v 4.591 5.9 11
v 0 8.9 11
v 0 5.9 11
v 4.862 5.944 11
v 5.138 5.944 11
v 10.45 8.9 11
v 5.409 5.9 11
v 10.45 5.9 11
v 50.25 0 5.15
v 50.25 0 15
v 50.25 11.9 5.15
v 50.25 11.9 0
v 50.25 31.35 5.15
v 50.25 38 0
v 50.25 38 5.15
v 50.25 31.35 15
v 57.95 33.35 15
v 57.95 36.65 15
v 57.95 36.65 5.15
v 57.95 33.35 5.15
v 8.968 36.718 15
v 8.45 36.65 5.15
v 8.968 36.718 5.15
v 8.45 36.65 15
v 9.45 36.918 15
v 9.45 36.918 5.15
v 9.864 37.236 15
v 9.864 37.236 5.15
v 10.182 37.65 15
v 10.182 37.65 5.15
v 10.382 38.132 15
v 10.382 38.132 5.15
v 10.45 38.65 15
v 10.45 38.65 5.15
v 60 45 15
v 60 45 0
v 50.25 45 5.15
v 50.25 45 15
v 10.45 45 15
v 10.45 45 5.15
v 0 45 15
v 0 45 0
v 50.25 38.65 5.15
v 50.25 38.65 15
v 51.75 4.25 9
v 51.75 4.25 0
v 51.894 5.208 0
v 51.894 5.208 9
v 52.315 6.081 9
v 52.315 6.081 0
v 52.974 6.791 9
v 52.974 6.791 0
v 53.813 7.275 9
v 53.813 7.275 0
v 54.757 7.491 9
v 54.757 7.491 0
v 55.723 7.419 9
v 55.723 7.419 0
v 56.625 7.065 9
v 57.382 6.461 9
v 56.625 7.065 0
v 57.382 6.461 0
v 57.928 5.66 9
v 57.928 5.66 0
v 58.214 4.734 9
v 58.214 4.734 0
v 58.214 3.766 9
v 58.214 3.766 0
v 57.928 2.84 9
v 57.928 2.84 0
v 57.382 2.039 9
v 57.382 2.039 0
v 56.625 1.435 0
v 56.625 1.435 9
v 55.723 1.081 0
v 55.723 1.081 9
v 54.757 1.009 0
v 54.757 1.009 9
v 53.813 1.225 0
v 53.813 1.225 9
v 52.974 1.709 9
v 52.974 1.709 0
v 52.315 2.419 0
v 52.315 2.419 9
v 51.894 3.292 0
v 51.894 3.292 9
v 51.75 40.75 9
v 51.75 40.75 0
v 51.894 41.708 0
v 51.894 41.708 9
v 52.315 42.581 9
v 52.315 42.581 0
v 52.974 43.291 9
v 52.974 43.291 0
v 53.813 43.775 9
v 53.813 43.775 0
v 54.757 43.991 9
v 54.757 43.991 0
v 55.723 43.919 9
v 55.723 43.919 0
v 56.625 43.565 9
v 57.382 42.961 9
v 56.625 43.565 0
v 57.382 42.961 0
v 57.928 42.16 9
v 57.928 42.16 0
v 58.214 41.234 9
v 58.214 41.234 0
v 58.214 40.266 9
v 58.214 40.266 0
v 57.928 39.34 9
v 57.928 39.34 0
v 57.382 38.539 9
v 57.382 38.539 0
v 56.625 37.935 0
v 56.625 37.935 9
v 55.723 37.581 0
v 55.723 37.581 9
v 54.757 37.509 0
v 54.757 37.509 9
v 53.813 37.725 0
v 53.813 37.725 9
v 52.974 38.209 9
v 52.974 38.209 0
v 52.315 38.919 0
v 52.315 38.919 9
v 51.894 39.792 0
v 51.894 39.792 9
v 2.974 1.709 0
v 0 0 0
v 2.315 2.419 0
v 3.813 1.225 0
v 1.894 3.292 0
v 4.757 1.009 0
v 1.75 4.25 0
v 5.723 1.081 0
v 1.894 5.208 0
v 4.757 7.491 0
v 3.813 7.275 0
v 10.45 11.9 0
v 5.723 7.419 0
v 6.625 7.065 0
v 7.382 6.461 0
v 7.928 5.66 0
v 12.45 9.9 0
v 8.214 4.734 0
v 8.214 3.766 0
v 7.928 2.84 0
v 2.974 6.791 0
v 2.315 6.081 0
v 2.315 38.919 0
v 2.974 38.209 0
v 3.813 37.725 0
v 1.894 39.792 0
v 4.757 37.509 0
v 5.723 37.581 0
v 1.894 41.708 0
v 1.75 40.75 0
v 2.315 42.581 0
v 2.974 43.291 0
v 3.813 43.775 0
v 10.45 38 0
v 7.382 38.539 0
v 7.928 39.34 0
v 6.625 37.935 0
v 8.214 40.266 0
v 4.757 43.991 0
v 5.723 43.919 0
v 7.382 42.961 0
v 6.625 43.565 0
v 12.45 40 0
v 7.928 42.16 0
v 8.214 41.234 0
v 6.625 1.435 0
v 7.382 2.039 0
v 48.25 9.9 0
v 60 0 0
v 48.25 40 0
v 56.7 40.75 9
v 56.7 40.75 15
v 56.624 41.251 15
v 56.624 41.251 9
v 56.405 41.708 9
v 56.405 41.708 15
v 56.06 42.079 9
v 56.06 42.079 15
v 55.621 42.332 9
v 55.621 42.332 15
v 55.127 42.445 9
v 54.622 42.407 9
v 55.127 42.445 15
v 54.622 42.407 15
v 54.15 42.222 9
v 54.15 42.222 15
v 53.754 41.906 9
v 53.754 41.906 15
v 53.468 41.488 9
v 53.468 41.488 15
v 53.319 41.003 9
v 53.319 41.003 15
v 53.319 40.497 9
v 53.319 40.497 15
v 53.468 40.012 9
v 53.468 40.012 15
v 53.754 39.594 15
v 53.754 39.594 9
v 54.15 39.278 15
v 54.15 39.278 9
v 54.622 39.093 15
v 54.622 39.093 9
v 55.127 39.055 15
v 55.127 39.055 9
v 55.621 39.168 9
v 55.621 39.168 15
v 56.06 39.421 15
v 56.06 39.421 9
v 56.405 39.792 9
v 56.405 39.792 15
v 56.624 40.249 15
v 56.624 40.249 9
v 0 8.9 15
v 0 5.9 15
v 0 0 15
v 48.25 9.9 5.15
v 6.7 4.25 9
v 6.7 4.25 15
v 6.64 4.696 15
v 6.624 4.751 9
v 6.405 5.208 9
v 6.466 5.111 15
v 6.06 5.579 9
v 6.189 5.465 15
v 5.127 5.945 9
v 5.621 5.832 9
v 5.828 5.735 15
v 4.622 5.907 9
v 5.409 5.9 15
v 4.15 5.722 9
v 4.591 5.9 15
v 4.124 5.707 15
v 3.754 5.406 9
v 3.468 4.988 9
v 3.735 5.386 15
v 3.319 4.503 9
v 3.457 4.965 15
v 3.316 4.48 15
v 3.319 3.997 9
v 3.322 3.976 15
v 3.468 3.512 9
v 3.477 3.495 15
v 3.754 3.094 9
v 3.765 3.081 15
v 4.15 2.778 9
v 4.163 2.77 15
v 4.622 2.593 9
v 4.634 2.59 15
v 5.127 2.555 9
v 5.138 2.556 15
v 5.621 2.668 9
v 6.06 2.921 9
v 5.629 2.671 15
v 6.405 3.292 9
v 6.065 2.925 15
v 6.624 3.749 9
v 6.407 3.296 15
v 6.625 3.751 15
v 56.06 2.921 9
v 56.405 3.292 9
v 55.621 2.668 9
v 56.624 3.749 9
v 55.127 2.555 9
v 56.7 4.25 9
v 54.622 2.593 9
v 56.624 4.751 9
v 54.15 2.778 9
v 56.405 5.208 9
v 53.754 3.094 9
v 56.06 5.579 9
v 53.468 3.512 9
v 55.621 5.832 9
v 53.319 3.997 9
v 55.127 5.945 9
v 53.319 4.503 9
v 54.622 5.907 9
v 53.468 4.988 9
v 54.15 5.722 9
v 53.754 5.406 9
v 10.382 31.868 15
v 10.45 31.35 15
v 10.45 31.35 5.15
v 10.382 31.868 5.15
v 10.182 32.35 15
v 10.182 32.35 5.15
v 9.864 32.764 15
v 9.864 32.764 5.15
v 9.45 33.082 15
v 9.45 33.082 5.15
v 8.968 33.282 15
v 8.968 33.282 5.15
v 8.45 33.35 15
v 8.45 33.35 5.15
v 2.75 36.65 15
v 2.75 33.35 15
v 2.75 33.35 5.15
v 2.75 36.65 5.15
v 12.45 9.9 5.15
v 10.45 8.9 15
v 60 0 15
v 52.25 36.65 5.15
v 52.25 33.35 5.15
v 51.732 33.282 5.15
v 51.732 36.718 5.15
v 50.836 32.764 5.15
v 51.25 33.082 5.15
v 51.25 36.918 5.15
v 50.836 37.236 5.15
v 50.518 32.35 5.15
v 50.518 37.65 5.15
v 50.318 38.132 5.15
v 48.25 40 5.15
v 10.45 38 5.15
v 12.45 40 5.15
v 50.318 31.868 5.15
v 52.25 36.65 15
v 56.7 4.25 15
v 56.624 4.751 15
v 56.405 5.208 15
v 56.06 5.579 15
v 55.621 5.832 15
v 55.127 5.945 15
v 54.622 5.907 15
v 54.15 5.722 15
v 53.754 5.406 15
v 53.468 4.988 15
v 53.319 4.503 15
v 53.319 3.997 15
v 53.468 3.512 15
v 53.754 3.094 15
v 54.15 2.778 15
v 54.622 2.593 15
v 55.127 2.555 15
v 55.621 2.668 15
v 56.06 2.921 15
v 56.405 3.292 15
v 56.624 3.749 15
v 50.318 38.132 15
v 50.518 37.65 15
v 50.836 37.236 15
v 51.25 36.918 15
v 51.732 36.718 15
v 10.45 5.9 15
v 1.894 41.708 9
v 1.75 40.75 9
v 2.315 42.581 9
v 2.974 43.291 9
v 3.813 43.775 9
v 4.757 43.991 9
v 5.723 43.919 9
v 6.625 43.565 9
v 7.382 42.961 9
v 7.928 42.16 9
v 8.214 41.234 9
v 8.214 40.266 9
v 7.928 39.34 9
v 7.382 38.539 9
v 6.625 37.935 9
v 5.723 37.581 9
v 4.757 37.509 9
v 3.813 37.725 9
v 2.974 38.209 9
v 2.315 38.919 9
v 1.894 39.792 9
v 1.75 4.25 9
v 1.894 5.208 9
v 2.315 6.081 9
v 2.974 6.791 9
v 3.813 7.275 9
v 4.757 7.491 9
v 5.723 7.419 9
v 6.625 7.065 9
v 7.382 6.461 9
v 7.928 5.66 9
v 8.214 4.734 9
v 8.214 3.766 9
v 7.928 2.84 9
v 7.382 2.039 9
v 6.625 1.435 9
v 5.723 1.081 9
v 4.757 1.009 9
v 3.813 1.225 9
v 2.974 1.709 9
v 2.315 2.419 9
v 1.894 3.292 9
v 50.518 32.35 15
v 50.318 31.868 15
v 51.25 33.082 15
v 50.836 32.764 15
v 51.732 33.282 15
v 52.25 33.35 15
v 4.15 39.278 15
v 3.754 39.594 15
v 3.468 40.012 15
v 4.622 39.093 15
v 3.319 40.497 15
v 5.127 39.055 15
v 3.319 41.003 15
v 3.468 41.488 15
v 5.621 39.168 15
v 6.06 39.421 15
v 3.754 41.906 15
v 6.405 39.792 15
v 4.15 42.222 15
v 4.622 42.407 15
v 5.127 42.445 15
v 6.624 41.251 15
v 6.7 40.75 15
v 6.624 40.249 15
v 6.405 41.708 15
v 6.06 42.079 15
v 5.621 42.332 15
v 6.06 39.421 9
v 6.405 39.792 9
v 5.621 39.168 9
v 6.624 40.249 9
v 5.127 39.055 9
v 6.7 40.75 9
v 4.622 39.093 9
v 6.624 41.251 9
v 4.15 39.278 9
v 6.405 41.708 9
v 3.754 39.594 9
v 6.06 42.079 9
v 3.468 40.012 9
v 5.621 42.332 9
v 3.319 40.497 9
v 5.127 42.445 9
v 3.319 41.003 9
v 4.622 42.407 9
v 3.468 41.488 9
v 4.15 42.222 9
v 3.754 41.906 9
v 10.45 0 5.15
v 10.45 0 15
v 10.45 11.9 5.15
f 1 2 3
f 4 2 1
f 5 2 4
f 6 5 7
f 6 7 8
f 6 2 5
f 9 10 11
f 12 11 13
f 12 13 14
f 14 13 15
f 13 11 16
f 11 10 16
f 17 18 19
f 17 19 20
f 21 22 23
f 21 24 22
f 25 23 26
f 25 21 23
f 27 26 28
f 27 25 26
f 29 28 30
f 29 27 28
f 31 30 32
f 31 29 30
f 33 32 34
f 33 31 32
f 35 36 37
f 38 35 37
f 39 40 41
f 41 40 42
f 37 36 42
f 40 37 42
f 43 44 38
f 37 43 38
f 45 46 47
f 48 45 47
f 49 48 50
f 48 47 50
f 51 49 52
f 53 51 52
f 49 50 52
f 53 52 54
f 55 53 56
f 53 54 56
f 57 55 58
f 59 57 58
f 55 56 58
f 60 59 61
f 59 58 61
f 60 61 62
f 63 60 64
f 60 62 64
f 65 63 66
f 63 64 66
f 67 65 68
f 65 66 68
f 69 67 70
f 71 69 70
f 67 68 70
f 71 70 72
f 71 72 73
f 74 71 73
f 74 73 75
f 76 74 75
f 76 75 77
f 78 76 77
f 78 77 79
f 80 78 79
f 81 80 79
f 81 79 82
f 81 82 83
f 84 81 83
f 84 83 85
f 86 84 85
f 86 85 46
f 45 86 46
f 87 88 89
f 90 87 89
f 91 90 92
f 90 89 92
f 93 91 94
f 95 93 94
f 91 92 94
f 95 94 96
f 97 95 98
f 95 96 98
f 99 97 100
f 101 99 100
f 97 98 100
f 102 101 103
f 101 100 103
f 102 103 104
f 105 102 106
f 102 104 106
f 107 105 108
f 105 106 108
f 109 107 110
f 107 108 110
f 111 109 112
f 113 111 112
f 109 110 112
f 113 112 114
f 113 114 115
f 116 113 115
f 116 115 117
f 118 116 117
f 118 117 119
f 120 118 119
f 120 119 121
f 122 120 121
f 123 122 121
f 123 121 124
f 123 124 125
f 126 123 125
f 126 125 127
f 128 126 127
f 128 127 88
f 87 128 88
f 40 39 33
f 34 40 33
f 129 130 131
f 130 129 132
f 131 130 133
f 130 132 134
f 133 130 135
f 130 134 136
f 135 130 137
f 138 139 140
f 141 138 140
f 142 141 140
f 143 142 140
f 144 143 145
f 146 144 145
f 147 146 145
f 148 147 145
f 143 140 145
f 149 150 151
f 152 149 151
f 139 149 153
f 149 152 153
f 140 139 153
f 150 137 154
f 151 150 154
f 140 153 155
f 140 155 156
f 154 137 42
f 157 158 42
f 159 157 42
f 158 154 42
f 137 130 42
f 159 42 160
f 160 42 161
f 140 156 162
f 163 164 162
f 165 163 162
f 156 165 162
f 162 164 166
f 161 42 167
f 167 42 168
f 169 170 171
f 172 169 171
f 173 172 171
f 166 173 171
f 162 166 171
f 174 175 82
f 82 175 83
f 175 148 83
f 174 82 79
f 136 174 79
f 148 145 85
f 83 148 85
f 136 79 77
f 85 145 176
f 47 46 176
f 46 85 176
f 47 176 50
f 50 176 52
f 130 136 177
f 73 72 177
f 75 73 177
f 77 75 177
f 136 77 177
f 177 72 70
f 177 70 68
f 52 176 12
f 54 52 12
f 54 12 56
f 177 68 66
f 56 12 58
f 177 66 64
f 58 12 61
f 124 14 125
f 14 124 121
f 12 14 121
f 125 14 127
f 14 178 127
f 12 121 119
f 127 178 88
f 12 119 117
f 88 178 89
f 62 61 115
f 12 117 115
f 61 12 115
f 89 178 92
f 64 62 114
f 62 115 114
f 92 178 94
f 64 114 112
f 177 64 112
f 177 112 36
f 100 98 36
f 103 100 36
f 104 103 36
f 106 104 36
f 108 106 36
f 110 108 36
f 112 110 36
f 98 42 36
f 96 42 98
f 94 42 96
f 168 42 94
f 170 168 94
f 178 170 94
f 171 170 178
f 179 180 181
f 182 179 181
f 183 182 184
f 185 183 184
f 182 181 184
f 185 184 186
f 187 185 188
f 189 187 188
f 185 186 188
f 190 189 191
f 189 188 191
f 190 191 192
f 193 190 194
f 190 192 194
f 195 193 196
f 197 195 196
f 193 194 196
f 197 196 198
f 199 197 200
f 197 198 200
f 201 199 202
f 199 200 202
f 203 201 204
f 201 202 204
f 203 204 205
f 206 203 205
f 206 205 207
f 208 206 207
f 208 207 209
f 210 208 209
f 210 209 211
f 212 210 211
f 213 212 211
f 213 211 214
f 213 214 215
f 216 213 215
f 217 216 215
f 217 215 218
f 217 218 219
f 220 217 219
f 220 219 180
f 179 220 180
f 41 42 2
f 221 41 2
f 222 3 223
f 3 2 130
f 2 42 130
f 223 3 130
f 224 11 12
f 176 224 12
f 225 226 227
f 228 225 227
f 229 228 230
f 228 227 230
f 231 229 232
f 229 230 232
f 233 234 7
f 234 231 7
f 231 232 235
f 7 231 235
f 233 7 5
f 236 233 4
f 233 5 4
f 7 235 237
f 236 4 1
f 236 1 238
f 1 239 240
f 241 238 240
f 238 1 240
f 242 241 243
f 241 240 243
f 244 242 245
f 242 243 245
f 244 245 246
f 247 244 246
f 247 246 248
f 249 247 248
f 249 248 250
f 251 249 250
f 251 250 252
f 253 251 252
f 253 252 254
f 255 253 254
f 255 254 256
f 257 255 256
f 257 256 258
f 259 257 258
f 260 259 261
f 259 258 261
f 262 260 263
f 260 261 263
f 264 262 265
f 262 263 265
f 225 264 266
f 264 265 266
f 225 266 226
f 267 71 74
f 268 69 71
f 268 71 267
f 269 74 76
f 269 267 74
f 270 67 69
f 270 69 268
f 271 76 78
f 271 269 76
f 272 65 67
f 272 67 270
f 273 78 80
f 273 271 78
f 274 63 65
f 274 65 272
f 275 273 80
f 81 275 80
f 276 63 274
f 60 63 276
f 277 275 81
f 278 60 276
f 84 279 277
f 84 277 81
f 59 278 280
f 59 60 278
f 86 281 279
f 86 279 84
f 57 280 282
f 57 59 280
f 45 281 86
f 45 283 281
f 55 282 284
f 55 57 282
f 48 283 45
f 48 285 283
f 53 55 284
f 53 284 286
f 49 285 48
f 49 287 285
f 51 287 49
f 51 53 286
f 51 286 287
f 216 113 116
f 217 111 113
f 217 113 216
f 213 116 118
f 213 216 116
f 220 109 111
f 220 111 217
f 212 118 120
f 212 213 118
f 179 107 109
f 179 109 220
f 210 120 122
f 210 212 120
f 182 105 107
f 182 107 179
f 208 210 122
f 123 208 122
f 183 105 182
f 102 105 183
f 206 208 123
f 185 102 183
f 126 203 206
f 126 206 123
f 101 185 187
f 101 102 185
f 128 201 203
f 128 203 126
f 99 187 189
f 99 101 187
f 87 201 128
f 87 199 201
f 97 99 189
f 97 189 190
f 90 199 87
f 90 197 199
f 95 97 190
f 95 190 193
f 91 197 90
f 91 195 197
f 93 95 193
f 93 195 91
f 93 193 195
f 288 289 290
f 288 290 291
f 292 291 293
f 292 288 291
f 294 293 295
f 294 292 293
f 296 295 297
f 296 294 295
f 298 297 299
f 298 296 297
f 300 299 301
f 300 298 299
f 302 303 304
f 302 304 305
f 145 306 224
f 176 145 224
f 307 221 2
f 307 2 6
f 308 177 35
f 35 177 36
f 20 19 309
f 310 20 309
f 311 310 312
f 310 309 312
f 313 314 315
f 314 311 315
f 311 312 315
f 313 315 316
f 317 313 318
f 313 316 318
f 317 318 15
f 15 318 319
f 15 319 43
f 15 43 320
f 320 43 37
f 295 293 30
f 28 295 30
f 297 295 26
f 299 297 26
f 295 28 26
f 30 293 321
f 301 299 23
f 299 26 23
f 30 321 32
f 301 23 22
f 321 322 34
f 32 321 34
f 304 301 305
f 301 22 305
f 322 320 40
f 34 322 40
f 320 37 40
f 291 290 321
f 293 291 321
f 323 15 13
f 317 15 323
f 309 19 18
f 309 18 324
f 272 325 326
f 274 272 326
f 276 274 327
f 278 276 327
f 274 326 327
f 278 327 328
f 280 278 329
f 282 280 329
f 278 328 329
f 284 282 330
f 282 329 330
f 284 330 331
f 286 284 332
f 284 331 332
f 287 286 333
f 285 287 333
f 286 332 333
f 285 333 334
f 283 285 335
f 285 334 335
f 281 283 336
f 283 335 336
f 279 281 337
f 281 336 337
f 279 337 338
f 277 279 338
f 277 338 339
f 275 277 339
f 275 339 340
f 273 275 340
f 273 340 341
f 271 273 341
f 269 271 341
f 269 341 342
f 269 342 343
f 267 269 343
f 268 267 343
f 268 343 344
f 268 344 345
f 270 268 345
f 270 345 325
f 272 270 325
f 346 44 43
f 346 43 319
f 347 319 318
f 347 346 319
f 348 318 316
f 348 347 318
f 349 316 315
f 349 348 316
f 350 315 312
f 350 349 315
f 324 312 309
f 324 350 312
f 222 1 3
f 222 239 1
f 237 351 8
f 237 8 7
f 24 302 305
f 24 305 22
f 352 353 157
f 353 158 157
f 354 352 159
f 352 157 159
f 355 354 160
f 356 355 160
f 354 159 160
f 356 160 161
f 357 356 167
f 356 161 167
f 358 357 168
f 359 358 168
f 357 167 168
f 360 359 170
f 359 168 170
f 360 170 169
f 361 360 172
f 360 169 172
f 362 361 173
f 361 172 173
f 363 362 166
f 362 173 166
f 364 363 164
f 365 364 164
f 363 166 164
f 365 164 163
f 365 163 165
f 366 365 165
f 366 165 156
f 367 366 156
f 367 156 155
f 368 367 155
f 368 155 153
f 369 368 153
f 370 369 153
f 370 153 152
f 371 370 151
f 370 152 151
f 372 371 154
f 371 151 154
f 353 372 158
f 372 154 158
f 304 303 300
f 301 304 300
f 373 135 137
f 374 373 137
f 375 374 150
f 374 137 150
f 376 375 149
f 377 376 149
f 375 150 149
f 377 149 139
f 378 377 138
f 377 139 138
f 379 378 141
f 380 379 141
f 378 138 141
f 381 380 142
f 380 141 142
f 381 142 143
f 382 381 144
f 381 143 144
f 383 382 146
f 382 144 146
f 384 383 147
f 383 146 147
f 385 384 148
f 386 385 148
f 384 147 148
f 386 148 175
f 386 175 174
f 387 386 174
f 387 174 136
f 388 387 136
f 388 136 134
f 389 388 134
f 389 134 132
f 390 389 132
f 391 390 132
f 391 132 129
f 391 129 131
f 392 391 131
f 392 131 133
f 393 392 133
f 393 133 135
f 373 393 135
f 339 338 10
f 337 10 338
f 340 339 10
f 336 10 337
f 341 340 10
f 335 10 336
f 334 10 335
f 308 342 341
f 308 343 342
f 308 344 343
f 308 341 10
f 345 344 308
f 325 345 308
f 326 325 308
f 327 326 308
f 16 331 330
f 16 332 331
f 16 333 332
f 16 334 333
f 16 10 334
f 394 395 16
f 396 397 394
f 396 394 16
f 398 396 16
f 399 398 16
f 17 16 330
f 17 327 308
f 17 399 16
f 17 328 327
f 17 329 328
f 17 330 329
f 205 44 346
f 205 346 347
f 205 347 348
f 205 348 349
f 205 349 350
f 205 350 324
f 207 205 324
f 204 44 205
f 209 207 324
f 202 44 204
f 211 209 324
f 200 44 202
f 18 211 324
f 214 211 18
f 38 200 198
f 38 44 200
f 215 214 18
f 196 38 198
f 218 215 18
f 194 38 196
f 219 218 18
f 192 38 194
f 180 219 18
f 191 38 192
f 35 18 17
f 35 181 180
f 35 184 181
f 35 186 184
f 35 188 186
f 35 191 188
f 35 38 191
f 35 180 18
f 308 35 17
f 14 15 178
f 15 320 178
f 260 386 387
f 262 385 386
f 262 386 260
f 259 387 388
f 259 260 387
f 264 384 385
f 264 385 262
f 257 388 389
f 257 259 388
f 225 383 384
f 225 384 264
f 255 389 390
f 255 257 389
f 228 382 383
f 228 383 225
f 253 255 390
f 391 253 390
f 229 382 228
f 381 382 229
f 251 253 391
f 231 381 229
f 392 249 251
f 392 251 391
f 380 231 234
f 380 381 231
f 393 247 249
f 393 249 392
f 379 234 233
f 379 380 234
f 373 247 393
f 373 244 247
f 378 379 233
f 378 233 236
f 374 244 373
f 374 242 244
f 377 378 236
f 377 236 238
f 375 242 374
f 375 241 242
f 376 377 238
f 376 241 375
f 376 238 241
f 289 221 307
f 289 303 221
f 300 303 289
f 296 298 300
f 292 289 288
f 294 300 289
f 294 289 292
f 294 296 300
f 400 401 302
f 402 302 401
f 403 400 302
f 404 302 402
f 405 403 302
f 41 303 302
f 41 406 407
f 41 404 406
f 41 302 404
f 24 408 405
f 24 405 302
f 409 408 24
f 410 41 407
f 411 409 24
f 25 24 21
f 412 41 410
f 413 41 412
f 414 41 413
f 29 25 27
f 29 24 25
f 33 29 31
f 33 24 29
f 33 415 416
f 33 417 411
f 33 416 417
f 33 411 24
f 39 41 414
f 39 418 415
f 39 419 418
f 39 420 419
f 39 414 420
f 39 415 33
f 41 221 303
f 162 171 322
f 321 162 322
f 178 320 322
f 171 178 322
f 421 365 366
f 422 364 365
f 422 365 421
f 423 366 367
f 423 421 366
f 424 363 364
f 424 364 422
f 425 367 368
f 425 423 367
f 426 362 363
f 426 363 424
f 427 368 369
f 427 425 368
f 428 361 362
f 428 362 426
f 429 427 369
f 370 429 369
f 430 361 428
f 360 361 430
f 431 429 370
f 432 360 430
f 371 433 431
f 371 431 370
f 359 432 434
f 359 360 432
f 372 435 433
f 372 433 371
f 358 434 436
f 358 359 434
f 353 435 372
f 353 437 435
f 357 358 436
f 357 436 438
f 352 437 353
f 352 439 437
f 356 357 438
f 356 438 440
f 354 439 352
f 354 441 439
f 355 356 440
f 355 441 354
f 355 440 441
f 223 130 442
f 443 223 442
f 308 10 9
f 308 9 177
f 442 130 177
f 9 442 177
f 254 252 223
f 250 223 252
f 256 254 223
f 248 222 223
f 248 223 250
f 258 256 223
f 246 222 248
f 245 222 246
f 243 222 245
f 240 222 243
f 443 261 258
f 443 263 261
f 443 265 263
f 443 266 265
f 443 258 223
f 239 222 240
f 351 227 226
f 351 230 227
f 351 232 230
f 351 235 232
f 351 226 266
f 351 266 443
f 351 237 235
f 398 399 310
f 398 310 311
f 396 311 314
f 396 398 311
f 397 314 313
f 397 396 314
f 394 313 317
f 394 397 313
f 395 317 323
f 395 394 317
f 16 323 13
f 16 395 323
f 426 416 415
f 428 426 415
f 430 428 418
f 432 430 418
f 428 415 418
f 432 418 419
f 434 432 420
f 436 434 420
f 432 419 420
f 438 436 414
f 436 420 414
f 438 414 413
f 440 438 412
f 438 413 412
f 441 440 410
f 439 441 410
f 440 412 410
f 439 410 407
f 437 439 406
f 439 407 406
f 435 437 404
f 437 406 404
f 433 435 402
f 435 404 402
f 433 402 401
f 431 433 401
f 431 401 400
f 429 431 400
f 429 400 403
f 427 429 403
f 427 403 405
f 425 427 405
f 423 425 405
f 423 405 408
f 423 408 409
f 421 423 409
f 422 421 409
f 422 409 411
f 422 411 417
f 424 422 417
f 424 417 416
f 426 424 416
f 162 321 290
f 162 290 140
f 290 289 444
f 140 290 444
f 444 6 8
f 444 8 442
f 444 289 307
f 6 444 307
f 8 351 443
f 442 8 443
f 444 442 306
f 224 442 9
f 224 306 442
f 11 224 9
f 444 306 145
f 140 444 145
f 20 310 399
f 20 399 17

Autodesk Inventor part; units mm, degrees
ref_plane "YZ Plane" through (0, 0, 0) normal (1, 0, 0) x (0, 1, 0)
ref_plane "XZ Plane" through (0, 0, 0) normal (0, 1, 0) x (-1, 0, 0)
ref_plane "XY Plane" through (0, 0, 0) normal (0, 0, 1) x (1, 0, 0)
sketch "Sketch2" plane through (0, 0, 0) normal (0, 0, 1) x (1, 0, 0)
  line L0 (0, 0) -> (60, 0)
  line L1 (60, 0) -> (60, 45)
  line L2 (60, 45) -> (0, 45)
  line L3 (0, 45) -> (0, 0)
  dimension "d0" = 60
  dimension "d1" = 45
extrude "Cover_Body" add sketch "Sketch2" along normal blind 15
sketch "Sketch4" plane through (0, 0, 15) normal (0, 0, 1) x (1, 0, 0)
  line L0 (60, 45) -> (0, 45) projected
  line L1 (0, 45) -> (0, 0) projected
  line L2 (2.75, 33.35) -> (10.45, 33.35)
  line L3 (50.25, 33.35) -> (57.95, 33.35)
  line L4 (60, 0) -> (60, 45) projected
  line L5 (0, 0) -> (60, 0) projected
  line L6 (2.75, 33.35) -> (2.75, 36.65)
  line L7 (2.75, 36.65) -> (10.45, 36.65)
  line L8 (10.45, 36.65) -> (10.45, 45)
  line L9 (57.95, 36.65) -> (57.95, 33.35)
  line L10 (57.95, 36.65) -> (50.25, 36.65)
  line L11 (50.25, 36.65) -> (50.25, 45)
  line L12 (10.45, 45) -> (50.25, 45)
  line L13 (30, 36.5125) -> (30, -47.625) construction
  line L14 (50.25, 33.35) -> (50.25, 0)
  line L15 (10.45, 33.35) -> (10.45, 0)
  line L16 (10.45, 0) -> (50.25, 0)
  line L17 (-12.9814, 35) -> (83.563, 35) construction
  dimension "d6" = 7.7
  dimension "d14" = 3.3
  dimension "d15" = 3.3
  dimension "d22" = 60
  dimension "d23" = 30
  dimension "d28" = 7.7
  dimension "d118" = 39.8
  dimension "d130" = 33.35
  dimension "d140" = 36.65
  dimension "d141" = 10
  dimension "d142" = 10.45
extrude "Servo_Intake" cut sketch "Sketch4" against normal blind 9.85 contours L11 L10 L9 L3 L14 L5 L15 L2 L6 L7 L8 L0
sketch "Sketch5" plane through (0, 0, 15) normal (0, 0, 1) x (1, 0, 0)
  line L0 (0, 5.9) -> (0, 8.9)
  line L1 (-28.5301, 7.4) -> (55.9395, 7.4) construction
  line L2 (0, 8.9) -> (10.45, 8.9)
  line L3 (10.45, 8.9) -> (10.45, 5.9)
  line L4 (10.45, 5.9) -> (0, 5.9)
  line L5 (10.45, 0) -> (10.45, 33.35) projected
  line L6 (0, 45) -> (0, 0) projected
  line L7 (0, 0) -> (10.45, 0) projected
  dimension "d97" = 3
  dimension "d137" = 5.9
  dimension "d153" = 7.4
extrude "Cable_Opening" cut sketch "Sketch5" against normal blind 4 contours L0 L2 L3 L4
sketch "Sketch6" plane through (0, 0, 15) normal (0, 0, 1) x (1, 0, 0)
  circle A0 centre (5, 40.75) radius 1.7
  circle A1 centre (55, 40.75) radius 1.7
  circle A2 centre (55, 4.25) radius 1.7
  circle A3 centre (5, 4.25) radius 1.7
  line L0 (30, 47.1) -> (30, -0.525) construction
  line L1 (-11.6375, 22.5) -> (75.675, 22.5) construction
  line L2 (60, 0) -> (60, 45) projected
  line L3 (0, 45) -> (0, 0) projected
  line L4 (10.45, 45) -> (0, 45) projected
  line L5 (0, 0) -> (60, 0) projected
  point P0 (42, 12.35)
  point P1 (0, 12.35)
  dimension "d29" = 3.4
  dimension "d30" = 3.4
  dimension "d31" = 3.4
  dimension "d32" = 3.4
  dimension "d33" = 60
  dimension "d34" = 30
  dimension "d35" = 45
  dimension "d36" = 22.5
  dimension "d37" = 50
  dimension "d38" = 25
  dimension "d39" = 36.5
  dimension "d40" = 18.25
extrude "Screw_Holes" cut sketch "Sketch6" against normal blind 36.5
sketch "Sketch16" plane through (0, 0, 0) normal (0, 0, -1) x (-1, 0, 0)
  circle A0 centre (-55, 4.25) radius 3.25
  circle A1 centre (-5, 40.75) radius 3.25
  circle A2 centre (-55, 4.25) radius 1.7 projected
  circle A3 centre (-5, 40.75) radius 1.7 projected
  circle A4 centre (-5, 4.25) radius 1.7 projected
  circle A5 centre (-5, 4.25) radius 3.25
  circle A6 centre (-55, 40.75) radius 1.7 projected
  circle A7 centre (-55, 40.75) radius 3.25
  dimension "d99" = 6.5
  dimension "d100" = 6.5
  dimension "d151" = 6.5
  dimension "d152" = 6.5
extrude "Screw_Pockets" cut sketch "Sketch16" against normal blind 9 contours A0 | A1 | A2 | A3 | A5 | A7
sketch "Sketch24" plane through (0, 0, 5.15) normal (0, 0, 1) x (1, 0, 0)
  line L0 (10.45, 9.9) -> (50.25, 9.9)
  line L1 (50.25, 9.9) -> (50.25, 40)
  line L2 (50.25, 40) -> (10.45, 40)
  line L3 (10.45, 40) -> (10.45, 9.9)
  line L4 (50.25, 0) -> (10.45, 0) projected
  line L5 (10.45, 45) -> (50.25, 45) projected
  line L6 (10.45, 0) -> (10.45, 33.35) projected
  line L7 (50.25, 33.35) -> (50.25, 0) projected
  point P0 (0, 0)
  dimension "d143" = 9.9
  dimension "d144" = 5
extrude "Cooling_Opening" cut sketch "Sketch24" against normal up to surface (5.15 mm away) contours L3 L2 L1 L0
chamfer "Chamfer1" distance 2 angle 45 4 edges at (10.45, 9.9, 2.575) (50.25, 9.9, 2.575) (50.25, 40, 2.575) (10.45, 40, 2.575)
fillet "Fillet2" radius 2 4 edges at (10.45, 36.65, 10.075) (10.45, 33.35, 10.075) (50.25, 36.65, 10.075) (50.25, 33.35, 10.075)
equation "\"d15\" = d14"
equation "\"d23\" = 0.5 * d22"
equation "\"d28\" = d6"
equation "\"d30\" = d29"
equation "\"d31\" = d29"
equation "\"d32\" = d29"
equation "\"d34\" = 0.5 * d33"
equation "\"d36\" = 0.5 * d35"
equation "\"d38\" = 0.5 * d37"
equation "\"d40\" = 0.5 * d39"
equation "\"d41\" = d39"
equation "\"d99\" = d100"
equation "\"d151\" = d100"
equation "\"d152\" = d100"
properties part number "EDMO1-1_Cover" material "PLA"
